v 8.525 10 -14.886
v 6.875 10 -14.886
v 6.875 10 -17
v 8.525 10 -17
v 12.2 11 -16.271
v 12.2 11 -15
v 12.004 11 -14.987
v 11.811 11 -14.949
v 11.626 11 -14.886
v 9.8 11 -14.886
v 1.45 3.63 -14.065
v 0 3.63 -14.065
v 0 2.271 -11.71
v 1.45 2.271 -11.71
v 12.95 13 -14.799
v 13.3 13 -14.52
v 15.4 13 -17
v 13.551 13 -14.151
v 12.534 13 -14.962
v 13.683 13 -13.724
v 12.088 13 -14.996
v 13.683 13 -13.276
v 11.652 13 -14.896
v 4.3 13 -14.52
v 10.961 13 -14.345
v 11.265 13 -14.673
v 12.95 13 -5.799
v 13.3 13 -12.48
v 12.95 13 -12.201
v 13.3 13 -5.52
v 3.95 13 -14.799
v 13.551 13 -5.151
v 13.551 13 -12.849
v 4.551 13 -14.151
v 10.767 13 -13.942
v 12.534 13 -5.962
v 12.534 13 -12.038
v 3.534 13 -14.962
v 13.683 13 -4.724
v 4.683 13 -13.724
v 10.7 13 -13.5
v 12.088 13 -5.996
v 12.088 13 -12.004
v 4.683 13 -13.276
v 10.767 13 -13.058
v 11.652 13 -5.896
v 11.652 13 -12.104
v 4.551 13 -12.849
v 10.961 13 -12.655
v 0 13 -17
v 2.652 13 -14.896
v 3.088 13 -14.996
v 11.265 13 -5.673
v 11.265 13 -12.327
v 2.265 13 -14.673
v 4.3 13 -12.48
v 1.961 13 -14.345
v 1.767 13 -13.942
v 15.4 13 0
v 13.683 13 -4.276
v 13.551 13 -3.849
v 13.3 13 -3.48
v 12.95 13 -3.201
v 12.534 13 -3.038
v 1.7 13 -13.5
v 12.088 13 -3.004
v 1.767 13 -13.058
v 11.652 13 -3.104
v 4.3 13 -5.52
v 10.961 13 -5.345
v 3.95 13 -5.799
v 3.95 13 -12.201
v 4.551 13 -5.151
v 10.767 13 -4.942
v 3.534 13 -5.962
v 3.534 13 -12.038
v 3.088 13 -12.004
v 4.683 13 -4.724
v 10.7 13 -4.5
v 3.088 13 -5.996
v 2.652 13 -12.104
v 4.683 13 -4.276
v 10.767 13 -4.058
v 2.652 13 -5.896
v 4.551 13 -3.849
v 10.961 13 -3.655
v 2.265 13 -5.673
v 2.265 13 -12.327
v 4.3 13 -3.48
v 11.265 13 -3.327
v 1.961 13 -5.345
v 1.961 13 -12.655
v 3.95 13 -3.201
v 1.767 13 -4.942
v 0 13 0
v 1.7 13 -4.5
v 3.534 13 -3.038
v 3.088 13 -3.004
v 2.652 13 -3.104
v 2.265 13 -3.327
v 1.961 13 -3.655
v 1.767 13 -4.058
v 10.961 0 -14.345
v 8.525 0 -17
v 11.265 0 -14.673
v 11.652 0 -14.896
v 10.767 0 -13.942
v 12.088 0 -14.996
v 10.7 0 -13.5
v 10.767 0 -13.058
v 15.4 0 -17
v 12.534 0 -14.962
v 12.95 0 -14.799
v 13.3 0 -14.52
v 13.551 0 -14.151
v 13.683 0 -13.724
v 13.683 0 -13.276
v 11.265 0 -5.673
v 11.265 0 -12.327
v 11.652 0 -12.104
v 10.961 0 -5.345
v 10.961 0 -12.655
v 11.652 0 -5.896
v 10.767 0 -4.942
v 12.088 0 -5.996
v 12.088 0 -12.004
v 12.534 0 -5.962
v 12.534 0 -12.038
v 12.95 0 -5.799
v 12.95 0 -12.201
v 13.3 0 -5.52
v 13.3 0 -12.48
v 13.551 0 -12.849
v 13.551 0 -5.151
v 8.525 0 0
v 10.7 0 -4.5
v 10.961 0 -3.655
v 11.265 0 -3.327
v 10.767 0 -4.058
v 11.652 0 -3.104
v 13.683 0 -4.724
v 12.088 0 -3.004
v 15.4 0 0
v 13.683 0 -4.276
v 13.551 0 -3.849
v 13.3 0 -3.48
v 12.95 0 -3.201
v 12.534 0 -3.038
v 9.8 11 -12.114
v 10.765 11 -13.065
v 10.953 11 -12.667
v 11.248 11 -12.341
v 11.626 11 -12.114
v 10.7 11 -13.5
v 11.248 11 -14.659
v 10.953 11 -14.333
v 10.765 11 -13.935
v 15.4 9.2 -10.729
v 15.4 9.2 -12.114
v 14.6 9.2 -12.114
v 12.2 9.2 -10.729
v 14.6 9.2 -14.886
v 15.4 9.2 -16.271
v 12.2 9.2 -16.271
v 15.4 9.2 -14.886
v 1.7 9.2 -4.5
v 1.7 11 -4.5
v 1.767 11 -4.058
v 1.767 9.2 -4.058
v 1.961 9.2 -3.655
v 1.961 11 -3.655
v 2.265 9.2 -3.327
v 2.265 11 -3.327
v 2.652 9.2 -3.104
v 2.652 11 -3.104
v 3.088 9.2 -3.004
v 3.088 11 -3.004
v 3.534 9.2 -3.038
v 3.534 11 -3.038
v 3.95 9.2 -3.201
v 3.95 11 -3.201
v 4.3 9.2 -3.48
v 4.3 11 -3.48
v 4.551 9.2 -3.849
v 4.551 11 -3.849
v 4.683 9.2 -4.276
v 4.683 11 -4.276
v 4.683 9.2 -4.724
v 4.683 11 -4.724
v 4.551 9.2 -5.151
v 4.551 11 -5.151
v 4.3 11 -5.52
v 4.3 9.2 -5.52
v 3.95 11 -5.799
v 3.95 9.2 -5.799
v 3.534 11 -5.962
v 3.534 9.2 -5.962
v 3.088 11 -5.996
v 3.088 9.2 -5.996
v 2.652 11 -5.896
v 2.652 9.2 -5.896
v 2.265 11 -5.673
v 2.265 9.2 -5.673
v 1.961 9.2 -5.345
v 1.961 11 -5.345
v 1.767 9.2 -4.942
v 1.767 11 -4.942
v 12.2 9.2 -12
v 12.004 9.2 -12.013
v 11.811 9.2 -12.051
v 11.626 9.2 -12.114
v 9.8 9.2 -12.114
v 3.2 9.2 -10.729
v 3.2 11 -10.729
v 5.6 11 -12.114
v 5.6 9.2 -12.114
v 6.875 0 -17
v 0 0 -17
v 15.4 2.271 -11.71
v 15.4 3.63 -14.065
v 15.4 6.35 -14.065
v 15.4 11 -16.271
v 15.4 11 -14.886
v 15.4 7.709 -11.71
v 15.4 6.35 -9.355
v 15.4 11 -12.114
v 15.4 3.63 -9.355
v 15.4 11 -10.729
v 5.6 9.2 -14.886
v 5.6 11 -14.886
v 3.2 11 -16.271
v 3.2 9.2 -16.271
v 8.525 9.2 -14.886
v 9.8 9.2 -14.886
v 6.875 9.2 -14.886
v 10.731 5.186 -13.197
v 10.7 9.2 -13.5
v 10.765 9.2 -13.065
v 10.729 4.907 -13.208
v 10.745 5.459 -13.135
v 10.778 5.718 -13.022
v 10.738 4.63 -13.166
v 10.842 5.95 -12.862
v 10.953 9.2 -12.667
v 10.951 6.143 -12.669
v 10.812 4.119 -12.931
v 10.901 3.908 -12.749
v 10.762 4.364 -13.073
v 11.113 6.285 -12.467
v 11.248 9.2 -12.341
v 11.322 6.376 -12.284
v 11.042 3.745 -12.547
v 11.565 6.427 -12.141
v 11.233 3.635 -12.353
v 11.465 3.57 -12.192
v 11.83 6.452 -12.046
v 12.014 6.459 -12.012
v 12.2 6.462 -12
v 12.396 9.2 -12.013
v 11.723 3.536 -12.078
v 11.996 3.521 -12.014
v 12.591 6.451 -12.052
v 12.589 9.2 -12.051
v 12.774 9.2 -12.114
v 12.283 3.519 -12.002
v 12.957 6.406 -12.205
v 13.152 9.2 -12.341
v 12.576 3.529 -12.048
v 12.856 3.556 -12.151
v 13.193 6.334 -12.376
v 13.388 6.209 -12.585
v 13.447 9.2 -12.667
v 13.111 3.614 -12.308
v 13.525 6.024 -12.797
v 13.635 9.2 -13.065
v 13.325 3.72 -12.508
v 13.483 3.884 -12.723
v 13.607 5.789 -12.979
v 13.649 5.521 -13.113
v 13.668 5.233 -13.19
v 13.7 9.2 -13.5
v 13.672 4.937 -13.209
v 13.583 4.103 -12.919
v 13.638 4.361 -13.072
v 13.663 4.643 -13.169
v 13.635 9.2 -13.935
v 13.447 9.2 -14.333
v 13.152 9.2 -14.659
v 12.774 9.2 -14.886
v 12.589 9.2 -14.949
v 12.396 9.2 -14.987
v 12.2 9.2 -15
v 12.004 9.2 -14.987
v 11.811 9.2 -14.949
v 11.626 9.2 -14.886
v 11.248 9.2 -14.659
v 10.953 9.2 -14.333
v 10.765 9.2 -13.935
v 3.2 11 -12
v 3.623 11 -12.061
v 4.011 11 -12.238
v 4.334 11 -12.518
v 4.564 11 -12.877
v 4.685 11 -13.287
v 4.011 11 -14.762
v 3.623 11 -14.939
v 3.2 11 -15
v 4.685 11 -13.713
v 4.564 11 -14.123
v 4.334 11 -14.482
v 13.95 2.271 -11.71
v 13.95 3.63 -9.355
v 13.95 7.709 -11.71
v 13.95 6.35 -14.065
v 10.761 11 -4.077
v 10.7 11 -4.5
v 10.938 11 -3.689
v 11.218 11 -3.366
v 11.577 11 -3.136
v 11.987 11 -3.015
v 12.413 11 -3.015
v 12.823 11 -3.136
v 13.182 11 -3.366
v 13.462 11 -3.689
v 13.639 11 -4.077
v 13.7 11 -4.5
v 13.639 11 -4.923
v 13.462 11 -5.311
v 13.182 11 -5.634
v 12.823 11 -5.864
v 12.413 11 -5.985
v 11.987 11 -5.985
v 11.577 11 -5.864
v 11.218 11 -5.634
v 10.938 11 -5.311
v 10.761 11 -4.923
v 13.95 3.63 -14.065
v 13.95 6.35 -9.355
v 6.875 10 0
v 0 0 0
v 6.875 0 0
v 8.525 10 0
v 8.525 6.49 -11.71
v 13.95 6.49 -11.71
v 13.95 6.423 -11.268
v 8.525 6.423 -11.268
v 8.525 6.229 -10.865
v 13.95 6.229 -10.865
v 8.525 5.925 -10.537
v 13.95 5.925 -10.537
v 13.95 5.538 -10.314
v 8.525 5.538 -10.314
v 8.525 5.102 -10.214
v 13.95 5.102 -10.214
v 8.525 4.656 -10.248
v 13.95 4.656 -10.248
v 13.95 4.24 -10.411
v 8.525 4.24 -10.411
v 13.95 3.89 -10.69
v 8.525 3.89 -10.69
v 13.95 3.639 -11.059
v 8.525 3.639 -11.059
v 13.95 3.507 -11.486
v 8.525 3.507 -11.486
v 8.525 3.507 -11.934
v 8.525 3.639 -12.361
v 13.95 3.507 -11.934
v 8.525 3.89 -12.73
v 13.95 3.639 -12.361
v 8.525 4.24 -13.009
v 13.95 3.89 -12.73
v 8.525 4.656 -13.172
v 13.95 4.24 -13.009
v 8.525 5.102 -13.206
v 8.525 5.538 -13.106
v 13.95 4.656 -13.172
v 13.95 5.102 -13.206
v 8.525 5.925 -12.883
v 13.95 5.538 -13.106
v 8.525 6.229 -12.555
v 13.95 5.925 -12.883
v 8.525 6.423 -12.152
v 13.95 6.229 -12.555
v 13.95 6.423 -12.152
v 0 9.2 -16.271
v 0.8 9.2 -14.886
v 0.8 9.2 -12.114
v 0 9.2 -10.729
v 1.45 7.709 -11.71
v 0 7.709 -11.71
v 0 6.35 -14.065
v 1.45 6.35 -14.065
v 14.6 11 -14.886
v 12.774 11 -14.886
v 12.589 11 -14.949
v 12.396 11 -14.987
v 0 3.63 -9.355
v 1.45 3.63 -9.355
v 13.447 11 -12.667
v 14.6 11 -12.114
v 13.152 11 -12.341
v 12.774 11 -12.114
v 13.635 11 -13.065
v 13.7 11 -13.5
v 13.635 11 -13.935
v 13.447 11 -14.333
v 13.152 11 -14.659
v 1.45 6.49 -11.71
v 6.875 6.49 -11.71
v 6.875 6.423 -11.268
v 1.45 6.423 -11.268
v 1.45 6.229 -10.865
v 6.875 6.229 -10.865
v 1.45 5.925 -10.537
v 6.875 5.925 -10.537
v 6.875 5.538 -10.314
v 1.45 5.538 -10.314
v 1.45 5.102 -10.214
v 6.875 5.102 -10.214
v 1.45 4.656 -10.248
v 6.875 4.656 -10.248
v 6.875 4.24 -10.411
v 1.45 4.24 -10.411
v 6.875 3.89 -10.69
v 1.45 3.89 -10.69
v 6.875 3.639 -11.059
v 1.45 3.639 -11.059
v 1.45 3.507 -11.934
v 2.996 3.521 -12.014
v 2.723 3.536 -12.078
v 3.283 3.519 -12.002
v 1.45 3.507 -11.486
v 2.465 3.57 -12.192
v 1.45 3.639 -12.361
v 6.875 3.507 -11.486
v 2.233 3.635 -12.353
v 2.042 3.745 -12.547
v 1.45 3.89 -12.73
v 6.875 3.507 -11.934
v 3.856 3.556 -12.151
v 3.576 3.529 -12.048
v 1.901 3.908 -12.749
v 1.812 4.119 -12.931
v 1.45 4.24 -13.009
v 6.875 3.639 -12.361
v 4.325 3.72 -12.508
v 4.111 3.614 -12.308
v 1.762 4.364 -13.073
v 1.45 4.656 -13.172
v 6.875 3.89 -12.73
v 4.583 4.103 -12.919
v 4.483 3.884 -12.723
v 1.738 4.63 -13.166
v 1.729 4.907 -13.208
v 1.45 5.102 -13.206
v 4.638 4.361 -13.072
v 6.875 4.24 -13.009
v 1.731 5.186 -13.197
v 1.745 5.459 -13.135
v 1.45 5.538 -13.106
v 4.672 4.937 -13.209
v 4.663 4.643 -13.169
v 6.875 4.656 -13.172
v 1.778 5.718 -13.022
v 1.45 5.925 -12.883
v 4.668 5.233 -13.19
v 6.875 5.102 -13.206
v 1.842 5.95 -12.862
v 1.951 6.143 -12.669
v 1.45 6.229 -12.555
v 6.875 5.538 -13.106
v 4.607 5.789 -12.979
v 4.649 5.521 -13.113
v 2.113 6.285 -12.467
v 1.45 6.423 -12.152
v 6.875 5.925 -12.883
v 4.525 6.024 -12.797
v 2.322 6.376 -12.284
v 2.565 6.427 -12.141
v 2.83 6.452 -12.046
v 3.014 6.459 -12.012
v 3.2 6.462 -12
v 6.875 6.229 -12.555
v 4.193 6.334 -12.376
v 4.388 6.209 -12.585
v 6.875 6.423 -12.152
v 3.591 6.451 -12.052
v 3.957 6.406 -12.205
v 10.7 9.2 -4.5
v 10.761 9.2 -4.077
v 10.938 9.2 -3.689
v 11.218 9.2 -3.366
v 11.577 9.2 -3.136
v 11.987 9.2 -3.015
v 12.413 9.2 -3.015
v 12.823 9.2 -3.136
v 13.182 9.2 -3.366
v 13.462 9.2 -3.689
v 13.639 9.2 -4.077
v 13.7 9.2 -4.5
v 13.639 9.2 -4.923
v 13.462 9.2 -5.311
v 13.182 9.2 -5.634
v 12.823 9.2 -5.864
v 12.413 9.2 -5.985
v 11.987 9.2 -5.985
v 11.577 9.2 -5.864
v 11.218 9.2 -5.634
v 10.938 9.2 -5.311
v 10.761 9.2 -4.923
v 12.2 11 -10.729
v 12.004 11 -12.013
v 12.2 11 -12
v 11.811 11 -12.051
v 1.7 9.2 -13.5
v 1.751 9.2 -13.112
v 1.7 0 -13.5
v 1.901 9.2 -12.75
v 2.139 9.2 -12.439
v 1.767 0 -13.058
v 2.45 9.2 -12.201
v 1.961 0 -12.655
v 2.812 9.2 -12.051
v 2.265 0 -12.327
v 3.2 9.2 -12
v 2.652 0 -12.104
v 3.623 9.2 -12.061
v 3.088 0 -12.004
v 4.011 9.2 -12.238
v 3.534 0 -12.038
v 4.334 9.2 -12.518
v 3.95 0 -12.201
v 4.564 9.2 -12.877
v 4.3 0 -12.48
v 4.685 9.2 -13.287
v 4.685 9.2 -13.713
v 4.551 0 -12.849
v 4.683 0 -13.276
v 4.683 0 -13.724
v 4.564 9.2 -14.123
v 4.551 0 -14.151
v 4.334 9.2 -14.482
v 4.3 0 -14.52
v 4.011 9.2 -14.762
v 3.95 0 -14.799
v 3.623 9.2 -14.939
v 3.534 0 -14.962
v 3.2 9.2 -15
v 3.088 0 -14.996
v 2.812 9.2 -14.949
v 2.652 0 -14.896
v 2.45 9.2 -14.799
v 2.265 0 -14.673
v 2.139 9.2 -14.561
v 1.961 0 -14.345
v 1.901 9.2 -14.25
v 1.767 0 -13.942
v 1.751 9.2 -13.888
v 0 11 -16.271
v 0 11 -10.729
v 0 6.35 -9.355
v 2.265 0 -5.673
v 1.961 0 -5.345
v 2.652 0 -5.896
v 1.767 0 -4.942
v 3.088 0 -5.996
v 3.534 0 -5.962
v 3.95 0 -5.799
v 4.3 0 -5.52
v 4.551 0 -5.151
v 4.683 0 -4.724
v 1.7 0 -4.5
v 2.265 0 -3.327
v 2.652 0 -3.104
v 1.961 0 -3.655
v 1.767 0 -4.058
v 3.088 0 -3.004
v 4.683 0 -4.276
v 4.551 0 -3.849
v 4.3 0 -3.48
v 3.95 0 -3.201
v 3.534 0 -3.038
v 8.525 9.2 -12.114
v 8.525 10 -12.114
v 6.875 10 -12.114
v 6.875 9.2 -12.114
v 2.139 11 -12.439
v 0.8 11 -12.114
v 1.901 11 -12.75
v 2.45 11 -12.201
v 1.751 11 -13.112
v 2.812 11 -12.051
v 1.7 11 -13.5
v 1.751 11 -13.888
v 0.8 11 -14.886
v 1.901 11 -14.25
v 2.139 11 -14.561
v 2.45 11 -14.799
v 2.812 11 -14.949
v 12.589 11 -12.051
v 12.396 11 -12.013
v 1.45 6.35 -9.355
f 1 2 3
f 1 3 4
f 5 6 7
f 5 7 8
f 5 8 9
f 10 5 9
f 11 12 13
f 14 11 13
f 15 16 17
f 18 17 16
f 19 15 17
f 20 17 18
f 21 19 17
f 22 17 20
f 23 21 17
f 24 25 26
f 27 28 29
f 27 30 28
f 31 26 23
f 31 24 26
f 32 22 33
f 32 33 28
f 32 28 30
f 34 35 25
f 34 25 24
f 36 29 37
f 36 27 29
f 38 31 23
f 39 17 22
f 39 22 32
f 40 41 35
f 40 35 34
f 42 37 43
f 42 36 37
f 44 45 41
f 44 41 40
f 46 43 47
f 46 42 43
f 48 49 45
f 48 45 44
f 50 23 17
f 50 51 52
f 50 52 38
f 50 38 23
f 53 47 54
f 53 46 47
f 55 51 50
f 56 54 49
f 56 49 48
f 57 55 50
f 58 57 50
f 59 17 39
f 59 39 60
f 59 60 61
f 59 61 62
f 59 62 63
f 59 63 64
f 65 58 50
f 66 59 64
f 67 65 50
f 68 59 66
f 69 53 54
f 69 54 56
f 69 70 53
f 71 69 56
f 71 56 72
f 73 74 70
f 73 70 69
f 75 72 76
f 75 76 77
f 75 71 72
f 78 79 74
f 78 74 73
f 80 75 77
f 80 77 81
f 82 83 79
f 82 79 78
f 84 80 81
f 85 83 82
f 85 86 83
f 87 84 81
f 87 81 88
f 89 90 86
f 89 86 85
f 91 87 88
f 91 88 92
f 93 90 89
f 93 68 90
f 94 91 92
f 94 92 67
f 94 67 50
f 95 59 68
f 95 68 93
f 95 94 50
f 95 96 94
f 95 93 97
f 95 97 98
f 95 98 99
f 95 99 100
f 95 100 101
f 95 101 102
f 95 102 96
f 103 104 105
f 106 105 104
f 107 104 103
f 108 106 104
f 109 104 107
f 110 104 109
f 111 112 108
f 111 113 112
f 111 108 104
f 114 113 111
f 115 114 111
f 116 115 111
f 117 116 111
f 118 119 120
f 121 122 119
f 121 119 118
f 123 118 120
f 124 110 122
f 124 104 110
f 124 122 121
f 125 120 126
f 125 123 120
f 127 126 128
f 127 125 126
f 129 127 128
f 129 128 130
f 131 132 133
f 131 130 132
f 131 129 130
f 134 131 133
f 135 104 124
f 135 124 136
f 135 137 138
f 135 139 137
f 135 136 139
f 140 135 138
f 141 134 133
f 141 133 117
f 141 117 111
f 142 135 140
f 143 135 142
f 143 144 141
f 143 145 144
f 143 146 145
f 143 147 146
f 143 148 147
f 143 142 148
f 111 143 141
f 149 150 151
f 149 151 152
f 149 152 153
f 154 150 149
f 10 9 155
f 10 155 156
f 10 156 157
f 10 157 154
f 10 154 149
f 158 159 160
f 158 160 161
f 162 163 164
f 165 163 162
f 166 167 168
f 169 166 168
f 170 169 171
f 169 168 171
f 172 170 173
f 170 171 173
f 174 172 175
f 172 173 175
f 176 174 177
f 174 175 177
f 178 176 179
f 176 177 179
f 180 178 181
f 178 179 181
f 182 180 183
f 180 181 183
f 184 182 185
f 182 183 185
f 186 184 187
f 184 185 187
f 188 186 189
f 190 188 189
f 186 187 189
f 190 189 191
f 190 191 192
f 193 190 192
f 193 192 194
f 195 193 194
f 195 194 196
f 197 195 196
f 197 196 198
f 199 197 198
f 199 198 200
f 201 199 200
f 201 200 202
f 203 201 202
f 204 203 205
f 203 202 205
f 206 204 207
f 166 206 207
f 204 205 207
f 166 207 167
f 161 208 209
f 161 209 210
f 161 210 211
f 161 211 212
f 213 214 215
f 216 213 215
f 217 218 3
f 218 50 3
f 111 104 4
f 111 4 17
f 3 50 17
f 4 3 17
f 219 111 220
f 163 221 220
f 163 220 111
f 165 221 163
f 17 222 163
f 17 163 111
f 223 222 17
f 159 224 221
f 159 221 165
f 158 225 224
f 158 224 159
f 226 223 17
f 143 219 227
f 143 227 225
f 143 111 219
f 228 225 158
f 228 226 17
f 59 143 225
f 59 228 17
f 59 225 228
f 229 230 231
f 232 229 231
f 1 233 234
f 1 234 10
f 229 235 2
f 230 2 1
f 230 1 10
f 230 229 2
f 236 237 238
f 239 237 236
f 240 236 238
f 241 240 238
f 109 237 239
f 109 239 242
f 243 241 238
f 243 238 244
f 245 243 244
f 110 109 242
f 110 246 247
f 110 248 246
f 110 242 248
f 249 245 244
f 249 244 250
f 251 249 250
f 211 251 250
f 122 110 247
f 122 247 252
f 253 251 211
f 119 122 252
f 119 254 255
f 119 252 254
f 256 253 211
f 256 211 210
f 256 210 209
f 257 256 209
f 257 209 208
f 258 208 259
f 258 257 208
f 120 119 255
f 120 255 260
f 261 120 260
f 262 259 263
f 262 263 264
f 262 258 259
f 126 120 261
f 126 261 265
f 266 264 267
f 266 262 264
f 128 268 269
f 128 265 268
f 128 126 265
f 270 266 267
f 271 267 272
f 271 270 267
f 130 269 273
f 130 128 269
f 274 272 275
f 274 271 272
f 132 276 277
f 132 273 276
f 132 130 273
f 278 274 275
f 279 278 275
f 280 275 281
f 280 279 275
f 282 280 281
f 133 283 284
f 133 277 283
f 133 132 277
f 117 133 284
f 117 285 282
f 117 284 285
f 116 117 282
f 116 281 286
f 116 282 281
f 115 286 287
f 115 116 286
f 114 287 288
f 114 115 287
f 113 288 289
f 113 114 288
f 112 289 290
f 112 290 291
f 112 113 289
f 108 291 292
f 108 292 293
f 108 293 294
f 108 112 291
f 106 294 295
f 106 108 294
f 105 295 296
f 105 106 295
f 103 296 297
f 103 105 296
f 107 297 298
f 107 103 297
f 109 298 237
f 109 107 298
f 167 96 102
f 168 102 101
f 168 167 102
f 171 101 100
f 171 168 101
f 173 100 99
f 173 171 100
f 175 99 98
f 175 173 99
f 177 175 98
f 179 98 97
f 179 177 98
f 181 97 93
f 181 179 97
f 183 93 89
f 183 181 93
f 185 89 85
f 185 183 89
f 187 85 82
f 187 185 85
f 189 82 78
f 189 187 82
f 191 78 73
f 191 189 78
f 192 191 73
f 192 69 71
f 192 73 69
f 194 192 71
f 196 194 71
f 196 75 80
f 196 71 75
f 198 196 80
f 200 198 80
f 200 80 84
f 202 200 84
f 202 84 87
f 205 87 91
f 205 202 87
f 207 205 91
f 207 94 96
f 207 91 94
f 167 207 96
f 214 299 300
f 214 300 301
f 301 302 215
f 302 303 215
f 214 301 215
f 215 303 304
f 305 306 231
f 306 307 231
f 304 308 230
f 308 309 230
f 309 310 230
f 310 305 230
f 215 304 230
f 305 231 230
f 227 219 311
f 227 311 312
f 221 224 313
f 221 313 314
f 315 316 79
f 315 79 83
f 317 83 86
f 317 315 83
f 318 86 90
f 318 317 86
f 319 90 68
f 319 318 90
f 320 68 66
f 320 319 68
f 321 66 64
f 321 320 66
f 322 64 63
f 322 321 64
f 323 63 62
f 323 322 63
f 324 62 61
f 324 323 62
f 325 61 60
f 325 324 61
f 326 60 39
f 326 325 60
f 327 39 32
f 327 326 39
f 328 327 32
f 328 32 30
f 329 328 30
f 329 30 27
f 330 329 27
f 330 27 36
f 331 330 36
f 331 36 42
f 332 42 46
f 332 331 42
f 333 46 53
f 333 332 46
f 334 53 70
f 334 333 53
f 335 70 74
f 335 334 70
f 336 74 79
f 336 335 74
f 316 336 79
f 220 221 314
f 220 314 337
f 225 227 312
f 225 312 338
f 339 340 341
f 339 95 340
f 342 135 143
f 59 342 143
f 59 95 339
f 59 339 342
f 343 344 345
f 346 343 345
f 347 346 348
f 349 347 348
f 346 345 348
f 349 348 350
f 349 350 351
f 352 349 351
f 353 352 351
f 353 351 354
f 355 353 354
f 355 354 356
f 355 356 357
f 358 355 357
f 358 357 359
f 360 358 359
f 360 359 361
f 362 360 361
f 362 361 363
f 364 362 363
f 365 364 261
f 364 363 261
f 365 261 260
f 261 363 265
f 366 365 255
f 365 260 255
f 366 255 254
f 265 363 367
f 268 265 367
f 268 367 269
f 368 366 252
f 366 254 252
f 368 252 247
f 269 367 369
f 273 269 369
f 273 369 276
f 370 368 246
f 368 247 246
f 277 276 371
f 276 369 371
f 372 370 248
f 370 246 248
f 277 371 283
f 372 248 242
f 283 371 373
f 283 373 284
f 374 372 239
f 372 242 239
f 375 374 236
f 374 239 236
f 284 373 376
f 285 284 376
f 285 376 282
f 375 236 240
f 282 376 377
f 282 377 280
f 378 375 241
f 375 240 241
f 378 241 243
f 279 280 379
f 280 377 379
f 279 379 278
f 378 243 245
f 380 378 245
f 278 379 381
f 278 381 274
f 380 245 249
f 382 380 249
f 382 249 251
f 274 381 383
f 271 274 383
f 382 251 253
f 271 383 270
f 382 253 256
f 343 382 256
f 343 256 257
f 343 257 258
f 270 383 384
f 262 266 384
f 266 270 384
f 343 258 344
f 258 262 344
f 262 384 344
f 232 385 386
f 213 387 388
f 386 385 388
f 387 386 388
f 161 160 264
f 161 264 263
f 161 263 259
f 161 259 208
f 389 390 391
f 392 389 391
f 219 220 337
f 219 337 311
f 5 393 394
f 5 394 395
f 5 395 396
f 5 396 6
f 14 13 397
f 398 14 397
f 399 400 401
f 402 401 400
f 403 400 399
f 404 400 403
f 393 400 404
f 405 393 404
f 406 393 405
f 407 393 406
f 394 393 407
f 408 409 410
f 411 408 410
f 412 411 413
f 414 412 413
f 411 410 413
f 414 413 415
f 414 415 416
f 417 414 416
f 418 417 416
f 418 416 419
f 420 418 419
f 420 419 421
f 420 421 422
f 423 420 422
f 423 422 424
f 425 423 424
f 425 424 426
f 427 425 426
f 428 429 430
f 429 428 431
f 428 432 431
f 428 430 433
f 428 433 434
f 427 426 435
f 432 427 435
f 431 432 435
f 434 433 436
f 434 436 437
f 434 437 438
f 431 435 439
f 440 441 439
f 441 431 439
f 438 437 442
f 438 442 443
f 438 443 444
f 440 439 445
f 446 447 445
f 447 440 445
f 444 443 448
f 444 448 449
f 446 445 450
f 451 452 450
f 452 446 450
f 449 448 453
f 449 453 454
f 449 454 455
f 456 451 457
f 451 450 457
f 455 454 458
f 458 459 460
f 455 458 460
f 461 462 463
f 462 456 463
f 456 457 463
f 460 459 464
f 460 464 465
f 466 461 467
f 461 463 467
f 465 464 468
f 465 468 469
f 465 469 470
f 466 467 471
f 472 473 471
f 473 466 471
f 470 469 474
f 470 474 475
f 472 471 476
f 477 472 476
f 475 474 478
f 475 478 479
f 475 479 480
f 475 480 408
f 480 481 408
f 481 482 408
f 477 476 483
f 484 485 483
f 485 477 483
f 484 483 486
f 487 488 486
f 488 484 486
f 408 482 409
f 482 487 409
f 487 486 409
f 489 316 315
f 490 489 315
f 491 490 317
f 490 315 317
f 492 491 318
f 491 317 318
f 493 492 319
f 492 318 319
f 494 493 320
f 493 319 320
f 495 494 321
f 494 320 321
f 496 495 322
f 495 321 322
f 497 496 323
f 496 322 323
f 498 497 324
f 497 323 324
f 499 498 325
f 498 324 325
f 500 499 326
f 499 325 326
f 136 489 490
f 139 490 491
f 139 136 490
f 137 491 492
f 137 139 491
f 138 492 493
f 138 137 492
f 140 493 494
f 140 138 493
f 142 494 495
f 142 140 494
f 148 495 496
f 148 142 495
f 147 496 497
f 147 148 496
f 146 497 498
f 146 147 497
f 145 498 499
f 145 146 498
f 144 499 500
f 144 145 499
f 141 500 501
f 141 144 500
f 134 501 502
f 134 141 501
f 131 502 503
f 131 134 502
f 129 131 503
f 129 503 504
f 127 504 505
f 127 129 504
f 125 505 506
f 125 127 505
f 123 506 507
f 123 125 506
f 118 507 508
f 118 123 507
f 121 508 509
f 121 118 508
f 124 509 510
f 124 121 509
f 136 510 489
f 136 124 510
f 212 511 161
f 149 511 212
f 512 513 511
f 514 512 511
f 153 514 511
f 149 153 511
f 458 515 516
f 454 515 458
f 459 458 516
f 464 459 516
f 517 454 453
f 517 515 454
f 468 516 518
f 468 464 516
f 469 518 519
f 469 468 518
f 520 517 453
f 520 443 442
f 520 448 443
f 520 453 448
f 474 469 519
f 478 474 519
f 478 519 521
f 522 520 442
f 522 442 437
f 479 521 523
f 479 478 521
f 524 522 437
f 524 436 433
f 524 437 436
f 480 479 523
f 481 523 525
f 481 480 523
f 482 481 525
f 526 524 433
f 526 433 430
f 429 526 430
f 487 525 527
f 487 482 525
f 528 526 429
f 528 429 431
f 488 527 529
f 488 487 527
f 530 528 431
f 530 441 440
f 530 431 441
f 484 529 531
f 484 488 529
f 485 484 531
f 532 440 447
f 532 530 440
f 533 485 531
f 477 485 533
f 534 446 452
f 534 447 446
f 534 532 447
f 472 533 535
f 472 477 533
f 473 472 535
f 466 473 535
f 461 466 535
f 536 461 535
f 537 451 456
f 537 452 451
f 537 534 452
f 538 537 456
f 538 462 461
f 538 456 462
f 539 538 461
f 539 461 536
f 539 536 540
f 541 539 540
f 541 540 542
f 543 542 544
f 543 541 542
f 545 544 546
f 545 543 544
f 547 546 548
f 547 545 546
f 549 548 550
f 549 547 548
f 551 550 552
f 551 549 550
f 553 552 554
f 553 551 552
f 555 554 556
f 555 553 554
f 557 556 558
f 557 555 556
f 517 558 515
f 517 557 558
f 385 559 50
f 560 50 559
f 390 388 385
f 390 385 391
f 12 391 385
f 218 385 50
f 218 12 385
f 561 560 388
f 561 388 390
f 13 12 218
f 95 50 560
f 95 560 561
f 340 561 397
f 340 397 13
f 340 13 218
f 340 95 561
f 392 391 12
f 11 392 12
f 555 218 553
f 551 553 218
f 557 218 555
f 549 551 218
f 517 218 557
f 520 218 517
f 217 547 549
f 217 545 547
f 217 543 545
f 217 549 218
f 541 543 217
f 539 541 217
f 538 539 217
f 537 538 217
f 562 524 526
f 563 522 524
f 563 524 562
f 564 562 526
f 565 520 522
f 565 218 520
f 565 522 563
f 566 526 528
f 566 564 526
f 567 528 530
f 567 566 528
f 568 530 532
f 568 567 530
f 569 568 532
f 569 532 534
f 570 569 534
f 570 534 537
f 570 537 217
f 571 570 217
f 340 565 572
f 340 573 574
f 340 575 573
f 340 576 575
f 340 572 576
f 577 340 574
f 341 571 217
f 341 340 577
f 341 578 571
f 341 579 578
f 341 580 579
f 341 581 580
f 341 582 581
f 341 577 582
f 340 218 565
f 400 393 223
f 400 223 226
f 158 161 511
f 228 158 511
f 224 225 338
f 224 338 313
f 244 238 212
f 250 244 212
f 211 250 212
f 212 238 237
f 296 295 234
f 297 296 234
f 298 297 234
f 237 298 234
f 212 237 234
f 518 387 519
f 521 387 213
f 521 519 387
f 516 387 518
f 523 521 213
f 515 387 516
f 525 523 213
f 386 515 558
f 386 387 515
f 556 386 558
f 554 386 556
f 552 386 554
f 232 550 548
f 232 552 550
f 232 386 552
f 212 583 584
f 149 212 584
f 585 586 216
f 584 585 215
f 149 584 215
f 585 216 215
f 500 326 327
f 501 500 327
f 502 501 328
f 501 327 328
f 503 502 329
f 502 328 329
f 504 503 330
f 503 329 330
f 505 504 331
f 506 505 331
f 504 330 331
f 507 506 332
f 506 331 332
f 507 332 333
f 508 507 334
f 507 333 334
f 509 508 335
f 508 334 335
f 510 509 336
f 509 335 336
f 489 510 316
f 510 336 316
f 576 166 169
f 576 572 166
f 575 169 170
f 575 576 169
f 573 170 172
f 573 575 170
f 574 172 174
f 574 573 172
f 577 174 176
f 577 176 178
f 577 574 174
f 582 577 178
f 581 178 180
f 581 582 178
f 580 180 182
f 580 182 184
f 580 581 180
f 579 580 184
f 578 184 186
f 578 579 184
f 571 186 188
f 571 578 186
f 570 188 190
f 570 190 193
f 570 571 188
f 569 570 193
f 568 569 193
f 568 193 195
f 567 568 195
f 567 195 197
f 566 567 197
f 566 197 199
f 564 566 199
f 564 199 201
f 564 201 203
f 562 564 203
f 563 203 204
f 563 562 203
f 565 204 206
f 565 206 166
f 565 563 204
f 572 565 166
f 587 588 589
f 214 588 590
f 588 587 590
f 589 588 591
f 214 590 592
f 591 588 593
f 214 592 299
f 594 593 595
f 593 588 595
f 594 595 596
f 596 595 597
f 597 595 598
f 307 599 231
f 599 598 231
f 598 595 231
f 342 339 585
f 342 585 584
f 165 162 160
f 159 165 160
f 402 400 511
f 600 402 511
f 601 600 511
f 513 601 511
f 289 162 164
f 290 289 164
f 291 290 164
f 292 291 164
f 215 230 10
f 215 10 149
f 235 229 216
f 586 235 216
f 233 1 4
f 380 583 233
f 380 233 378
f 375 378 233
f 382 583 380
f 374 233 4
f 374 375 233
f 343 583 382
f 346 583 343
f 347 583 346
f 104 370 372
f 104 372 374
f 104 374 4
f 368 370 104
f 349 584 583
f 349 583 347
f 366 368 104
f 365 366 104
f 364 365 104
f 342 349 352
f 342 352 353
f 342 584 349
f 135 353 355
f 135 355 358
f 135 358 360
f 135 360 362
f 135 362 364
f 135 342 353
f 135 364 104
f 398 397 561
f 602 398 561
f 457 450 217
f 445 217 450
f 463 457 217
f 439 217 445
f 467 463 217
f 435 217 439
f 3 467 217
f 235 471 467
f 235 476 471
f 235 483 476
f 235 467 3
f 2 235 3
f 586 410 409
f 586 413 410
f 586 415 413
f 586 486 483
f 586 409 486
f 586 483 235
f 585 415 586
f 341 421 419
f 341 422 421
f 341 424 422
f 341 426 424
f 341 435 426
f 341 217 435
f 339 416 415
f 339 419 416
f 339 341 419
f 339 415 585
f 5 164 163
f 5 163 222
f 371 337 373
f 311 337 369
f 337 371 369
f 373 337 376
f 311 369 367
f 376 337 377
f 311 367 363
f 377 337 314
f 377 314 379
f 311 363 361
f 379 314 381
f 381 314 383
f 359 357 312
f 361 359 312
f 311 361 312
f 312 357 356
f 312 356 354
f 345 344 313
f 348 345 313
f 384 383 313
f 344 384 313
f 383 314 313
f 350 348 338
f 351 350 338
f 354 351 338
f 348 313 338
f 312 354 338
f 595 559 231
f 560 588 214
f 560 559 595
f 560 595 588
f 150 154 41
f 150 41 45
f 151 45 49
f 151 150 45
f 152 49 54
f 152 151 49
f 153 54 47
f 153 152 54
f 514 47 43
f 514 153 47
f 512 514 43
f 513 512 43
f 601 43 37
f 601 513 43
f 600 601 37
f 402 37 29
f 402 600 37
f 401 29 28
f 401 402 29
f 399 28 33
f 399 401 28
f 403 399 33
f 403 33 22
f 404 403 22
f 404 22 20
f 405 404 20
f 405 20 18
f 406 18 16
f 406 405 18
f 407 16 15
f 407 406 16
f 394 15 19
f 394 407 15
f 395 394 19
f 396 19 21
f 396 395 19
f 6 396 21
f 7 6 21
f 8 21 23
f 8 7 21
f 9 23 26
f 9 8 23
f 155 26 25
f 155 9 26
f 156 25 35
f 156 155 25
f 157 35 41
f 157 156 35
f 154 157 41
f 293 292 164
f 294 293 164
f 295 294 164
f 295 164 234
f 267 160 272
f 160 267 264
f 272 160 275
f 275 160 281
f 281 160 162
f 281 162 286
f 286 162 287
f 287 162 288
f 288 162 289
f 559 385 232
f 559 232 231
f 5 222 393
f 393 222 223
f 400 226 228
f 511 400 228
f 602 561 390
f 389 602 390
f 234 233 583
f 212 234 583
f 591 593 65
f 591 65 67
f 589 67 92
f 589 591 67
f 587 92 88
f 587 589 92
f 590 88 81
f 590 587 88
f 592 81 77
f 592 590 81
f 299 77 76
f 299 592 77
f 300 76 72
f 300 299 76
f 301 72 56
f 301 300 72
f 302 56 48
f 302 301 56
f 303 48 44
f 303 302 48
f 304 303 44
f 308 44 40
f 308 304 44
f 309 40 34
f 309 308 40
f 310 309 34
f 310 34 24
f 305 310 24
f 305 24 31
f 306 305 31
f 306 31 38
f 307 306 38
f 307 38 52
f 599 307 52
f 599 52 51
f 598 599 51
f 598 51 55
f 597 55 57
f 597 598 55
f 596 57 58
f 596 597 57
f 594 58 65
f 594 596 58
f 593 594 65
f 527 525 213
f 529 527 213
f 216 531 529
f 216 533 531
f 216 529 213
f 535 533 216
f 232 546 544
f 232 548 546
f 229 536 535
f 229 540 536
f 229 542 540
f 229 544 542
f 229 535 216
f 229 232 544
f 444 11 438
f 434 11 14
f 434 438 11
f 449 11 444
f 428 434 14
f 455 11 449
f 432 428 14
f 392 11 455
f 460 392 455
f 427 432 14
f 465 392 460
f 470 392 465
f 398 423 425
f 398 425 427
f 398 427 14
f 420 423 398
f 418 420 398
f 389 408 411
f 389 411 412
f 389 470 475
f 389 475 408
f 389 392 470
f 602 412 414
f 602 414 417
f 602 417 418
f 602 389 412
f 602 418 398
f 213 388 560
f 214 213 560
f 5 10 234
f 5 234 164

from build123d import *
from build123d.topology import SkipClean

# Parameters (mm, degrees)
BOSS_EXTRUDE1_DEPTH     = 17
SKETCH3_R               = 1.5
CUT_EXTRUDE1_DEPTH      = 27.365887051
SKETCH4_3_R             = 1.5
CUT_EXTRUDE3_DEPTH      = 1.8
CUT_EXTRUDE2_DEPTH      = 26.439339614
CUT_EXTRUDE2_DEPTH_BACK = 26.439339614
SKETCH4_R               = 1.5
SKETCH3_3_R             = 1.5
CUT_EXTRUDE4_DEPTH      = 1.45
SKETCH6_W               = 5.542562584
SKETCH6_H               = 1.8
CUT_EXTRUDE5_DEPTH      = 3.2
SKETCH7_W               = 2.771281292
SKETCH7_H               = 1.8
CUT_EXTRUDE6_DEPTH      = 24.538054295


with BuildPart() as part:
    # Sketch2 → Boss-Extrude1 (new body)
    with BuildSketch(Plane.XY):
        Polygon((0, 0), (6.875, 0), (6.875, 10), (8.525, 10), (8.525, 0), (15.4, 0), (15.4, 13), (0, 13), align=None)
    extrude(amount=-BOSS_EXTRUDE1_DEPTH)

    # Sketch3 → Cut-Extrude1 (cut, through all)
    with BuildSketch(Plane(origin=(15.4, 0, 0), x_dir=(0, 0, -1), z_dir=(1, 0, 0))):
        with Locations(Location((11.71, 4.99, 0), (0, 0, 90))):
            Circle(SKETCH3_R)
    extrude(amount=-CUT_EXTRUDE1_DEPTH, mode=Mode.SUBTRACT)

    # Sketch4<3> → Cut-Extrude3 (cut)
    # profile 1 of 4: a face of its own
    with BuildSketch(Plane(origin=(0, 11, 0), x_dir=(1, 0, 0), z_dir=(0, 1, 0))):
        with Locations(Location((3.2, 4.5, 0), (0, 0, 180))):
            Circle(SKETCH4_3_R)
    # profile 2 of 4: a face of its own
    with BuildSketch(Plane(origin=(0, 11, 0), x_dir=(1, 0, 0), z_dir=(0, 1, 0))):
        with Locations((12.2, 4.5)):
            Circle(SKETCH4_3_R)
    # profile 3 of 4: a face of its own
    with BuildSketch(Plane(origin=(0, 11, 0), x_dir=(1, 0, 0), z_dir=(0, 1, 0))):
        Polygon((9.8, 12.114359354), (9.8, 14.885640646), (12.2, 16.271281292), (14.6, 14.885640646), (14.6, 12.114359354), (12.2, 10.728718708), align=None)
        with Locations((12.2, 13.5)):
            Circle(SKETCH4_3_R, mode=Mode.SUBTRACT)
    # profile 4 of 4: a face of its own
    with BuildSketch(Plane(origin=(0, 11, 0), x_dir=(1, 0, 0), z_dir=(0, 1, 0))):
        Polygon((3.2, 16.271281292), (0.8, 14.885640646), (0.8, 12.114359354), (3.2, 10.728718708), (5.6, 12.114359354), (5.6, 14.885640646), align=None)
        with Locations(Location((3.2, 13.5, 0), (0, 0, 180))):
            Circle(SKETCH4_3_R, mode=Mode.SUBTRACT)
    extrude(amount=-CUT_EXTRUDE3_DEPTH, mode=Mode.SUBTRACT)

    # Sketch4 → Cut-Extrude2 (cut, two sides: drawn at the far end of the back side and taken through both)
    with SkipClean():  # the faces are left unmerged after this step: merging them gives an invalid solid
        with BuildSketch(Plane(origin=(0, 11, 0), x_dir=(1, 0, 0), z_dir=(0, 1, 0)).offset(-CUT_EXTRUDE2_DEPTH_BACK)):
            with Locations(Location((3.2, 13.5, 0), (0, 0, 180))):
                Circle(SKETCH4_R)
            with Locations(Location((12.2, 13.5, 0), (0, 0, 180))):
                Circle(SKETCH4_R)
            with Locations(Location((3.2, 4.5, 0), (0, 0, 180))):
                Circle(SKETCH4_R)
            with Locations(Location((12.2, 4.5, 0), (0, 0, 180))):
                Circle(SKETCH4_R)
        extrude(amount=CUT_EXTRUDE2_DEPTH + CUT_EXTRUDE2_DEPTH_BACK, mode=Mode.SUBTRACT)

    # Sketch3<3> → Cut-Extrude4 (cut)
    with SkipClean():  # the faces are left unmerged after this step: merging them gives an invalid solid
        with BuildSketch(Plane(origin=(15.4, 0, 0), x_dir=(0, 0, -1), z_dir=(1, 0, 0))):
            Polygon((14.065, 3.630340116), (11.71, 2.270680232), (9.355, 3.630340116), (9.355, 6.349659884), (11.71, 7.709319768), (14.065, 6.349659884), align=None)
            with Locations(Location((11.71, 4.99, 0), (0, 0, 90))):
                Circle(SKETCH3_3_R, mode=Mode.SUBTRACT)
        cut_extrude4 = extrude(amount=-CUT_EXTRUDE4_DEPTH, mode=Mode.SUBTRACT)

    # Mirror1: Cut-Extrude4 across plane
    with SkipClean():  # the faces are left unmerged after this step: merging them gives an invalid solid
        add(cut_extrude4.mirror(Plane(origin=(7.7, 0, 0), x_dir=(0, 0, 1), z_dir=(1, 0, 0))), mode=Mode.SUBTRACT)

    # Sketch6 → Cut-Extrude5 (cut)
    with SkipClean():  # the faces are left unmerged after this step: merging them gives an invalid solid
        with BuildSketch(Plane.ZY):
            with Locations((-13.5, 10.1)):
                Rectangle(SKETCH6_W, SKETCH6_H)
        cut_extrude5 = extrude(amount=-CUT_EXTRUDE5_DEPTH, mode=Mode.SUBTRACT)

    # Sketch7 → Cut-Extrude6 (cut, through all)
    with SkipClean():  # the faces are left unmerged after this step: merging them gives an invalid solid
        with BuildSketch(Plane.ZY.offset(-5.6)):
            with Locations((-13.5, 10.1)):
                Rectangle(SKETCH7_W, SKETCH7_H)
        extrude(amount=-CUT_EXTRUDE6_DEPTH, mode=Mode.SUBTRACT)

    # Mirror2: Cut-Extrude5 across plane
    with SkipClean():  # the faces are left unmerged after this step: merging them gives an invalid solid
        add(cut_extrude5.mirror(Plane(origin=(7.7, 0, 0), x_dir=(0, 0, 1), z_dir=(1, 0, 0))), mode=Mode.SUBTRACT)


solid = part.part
